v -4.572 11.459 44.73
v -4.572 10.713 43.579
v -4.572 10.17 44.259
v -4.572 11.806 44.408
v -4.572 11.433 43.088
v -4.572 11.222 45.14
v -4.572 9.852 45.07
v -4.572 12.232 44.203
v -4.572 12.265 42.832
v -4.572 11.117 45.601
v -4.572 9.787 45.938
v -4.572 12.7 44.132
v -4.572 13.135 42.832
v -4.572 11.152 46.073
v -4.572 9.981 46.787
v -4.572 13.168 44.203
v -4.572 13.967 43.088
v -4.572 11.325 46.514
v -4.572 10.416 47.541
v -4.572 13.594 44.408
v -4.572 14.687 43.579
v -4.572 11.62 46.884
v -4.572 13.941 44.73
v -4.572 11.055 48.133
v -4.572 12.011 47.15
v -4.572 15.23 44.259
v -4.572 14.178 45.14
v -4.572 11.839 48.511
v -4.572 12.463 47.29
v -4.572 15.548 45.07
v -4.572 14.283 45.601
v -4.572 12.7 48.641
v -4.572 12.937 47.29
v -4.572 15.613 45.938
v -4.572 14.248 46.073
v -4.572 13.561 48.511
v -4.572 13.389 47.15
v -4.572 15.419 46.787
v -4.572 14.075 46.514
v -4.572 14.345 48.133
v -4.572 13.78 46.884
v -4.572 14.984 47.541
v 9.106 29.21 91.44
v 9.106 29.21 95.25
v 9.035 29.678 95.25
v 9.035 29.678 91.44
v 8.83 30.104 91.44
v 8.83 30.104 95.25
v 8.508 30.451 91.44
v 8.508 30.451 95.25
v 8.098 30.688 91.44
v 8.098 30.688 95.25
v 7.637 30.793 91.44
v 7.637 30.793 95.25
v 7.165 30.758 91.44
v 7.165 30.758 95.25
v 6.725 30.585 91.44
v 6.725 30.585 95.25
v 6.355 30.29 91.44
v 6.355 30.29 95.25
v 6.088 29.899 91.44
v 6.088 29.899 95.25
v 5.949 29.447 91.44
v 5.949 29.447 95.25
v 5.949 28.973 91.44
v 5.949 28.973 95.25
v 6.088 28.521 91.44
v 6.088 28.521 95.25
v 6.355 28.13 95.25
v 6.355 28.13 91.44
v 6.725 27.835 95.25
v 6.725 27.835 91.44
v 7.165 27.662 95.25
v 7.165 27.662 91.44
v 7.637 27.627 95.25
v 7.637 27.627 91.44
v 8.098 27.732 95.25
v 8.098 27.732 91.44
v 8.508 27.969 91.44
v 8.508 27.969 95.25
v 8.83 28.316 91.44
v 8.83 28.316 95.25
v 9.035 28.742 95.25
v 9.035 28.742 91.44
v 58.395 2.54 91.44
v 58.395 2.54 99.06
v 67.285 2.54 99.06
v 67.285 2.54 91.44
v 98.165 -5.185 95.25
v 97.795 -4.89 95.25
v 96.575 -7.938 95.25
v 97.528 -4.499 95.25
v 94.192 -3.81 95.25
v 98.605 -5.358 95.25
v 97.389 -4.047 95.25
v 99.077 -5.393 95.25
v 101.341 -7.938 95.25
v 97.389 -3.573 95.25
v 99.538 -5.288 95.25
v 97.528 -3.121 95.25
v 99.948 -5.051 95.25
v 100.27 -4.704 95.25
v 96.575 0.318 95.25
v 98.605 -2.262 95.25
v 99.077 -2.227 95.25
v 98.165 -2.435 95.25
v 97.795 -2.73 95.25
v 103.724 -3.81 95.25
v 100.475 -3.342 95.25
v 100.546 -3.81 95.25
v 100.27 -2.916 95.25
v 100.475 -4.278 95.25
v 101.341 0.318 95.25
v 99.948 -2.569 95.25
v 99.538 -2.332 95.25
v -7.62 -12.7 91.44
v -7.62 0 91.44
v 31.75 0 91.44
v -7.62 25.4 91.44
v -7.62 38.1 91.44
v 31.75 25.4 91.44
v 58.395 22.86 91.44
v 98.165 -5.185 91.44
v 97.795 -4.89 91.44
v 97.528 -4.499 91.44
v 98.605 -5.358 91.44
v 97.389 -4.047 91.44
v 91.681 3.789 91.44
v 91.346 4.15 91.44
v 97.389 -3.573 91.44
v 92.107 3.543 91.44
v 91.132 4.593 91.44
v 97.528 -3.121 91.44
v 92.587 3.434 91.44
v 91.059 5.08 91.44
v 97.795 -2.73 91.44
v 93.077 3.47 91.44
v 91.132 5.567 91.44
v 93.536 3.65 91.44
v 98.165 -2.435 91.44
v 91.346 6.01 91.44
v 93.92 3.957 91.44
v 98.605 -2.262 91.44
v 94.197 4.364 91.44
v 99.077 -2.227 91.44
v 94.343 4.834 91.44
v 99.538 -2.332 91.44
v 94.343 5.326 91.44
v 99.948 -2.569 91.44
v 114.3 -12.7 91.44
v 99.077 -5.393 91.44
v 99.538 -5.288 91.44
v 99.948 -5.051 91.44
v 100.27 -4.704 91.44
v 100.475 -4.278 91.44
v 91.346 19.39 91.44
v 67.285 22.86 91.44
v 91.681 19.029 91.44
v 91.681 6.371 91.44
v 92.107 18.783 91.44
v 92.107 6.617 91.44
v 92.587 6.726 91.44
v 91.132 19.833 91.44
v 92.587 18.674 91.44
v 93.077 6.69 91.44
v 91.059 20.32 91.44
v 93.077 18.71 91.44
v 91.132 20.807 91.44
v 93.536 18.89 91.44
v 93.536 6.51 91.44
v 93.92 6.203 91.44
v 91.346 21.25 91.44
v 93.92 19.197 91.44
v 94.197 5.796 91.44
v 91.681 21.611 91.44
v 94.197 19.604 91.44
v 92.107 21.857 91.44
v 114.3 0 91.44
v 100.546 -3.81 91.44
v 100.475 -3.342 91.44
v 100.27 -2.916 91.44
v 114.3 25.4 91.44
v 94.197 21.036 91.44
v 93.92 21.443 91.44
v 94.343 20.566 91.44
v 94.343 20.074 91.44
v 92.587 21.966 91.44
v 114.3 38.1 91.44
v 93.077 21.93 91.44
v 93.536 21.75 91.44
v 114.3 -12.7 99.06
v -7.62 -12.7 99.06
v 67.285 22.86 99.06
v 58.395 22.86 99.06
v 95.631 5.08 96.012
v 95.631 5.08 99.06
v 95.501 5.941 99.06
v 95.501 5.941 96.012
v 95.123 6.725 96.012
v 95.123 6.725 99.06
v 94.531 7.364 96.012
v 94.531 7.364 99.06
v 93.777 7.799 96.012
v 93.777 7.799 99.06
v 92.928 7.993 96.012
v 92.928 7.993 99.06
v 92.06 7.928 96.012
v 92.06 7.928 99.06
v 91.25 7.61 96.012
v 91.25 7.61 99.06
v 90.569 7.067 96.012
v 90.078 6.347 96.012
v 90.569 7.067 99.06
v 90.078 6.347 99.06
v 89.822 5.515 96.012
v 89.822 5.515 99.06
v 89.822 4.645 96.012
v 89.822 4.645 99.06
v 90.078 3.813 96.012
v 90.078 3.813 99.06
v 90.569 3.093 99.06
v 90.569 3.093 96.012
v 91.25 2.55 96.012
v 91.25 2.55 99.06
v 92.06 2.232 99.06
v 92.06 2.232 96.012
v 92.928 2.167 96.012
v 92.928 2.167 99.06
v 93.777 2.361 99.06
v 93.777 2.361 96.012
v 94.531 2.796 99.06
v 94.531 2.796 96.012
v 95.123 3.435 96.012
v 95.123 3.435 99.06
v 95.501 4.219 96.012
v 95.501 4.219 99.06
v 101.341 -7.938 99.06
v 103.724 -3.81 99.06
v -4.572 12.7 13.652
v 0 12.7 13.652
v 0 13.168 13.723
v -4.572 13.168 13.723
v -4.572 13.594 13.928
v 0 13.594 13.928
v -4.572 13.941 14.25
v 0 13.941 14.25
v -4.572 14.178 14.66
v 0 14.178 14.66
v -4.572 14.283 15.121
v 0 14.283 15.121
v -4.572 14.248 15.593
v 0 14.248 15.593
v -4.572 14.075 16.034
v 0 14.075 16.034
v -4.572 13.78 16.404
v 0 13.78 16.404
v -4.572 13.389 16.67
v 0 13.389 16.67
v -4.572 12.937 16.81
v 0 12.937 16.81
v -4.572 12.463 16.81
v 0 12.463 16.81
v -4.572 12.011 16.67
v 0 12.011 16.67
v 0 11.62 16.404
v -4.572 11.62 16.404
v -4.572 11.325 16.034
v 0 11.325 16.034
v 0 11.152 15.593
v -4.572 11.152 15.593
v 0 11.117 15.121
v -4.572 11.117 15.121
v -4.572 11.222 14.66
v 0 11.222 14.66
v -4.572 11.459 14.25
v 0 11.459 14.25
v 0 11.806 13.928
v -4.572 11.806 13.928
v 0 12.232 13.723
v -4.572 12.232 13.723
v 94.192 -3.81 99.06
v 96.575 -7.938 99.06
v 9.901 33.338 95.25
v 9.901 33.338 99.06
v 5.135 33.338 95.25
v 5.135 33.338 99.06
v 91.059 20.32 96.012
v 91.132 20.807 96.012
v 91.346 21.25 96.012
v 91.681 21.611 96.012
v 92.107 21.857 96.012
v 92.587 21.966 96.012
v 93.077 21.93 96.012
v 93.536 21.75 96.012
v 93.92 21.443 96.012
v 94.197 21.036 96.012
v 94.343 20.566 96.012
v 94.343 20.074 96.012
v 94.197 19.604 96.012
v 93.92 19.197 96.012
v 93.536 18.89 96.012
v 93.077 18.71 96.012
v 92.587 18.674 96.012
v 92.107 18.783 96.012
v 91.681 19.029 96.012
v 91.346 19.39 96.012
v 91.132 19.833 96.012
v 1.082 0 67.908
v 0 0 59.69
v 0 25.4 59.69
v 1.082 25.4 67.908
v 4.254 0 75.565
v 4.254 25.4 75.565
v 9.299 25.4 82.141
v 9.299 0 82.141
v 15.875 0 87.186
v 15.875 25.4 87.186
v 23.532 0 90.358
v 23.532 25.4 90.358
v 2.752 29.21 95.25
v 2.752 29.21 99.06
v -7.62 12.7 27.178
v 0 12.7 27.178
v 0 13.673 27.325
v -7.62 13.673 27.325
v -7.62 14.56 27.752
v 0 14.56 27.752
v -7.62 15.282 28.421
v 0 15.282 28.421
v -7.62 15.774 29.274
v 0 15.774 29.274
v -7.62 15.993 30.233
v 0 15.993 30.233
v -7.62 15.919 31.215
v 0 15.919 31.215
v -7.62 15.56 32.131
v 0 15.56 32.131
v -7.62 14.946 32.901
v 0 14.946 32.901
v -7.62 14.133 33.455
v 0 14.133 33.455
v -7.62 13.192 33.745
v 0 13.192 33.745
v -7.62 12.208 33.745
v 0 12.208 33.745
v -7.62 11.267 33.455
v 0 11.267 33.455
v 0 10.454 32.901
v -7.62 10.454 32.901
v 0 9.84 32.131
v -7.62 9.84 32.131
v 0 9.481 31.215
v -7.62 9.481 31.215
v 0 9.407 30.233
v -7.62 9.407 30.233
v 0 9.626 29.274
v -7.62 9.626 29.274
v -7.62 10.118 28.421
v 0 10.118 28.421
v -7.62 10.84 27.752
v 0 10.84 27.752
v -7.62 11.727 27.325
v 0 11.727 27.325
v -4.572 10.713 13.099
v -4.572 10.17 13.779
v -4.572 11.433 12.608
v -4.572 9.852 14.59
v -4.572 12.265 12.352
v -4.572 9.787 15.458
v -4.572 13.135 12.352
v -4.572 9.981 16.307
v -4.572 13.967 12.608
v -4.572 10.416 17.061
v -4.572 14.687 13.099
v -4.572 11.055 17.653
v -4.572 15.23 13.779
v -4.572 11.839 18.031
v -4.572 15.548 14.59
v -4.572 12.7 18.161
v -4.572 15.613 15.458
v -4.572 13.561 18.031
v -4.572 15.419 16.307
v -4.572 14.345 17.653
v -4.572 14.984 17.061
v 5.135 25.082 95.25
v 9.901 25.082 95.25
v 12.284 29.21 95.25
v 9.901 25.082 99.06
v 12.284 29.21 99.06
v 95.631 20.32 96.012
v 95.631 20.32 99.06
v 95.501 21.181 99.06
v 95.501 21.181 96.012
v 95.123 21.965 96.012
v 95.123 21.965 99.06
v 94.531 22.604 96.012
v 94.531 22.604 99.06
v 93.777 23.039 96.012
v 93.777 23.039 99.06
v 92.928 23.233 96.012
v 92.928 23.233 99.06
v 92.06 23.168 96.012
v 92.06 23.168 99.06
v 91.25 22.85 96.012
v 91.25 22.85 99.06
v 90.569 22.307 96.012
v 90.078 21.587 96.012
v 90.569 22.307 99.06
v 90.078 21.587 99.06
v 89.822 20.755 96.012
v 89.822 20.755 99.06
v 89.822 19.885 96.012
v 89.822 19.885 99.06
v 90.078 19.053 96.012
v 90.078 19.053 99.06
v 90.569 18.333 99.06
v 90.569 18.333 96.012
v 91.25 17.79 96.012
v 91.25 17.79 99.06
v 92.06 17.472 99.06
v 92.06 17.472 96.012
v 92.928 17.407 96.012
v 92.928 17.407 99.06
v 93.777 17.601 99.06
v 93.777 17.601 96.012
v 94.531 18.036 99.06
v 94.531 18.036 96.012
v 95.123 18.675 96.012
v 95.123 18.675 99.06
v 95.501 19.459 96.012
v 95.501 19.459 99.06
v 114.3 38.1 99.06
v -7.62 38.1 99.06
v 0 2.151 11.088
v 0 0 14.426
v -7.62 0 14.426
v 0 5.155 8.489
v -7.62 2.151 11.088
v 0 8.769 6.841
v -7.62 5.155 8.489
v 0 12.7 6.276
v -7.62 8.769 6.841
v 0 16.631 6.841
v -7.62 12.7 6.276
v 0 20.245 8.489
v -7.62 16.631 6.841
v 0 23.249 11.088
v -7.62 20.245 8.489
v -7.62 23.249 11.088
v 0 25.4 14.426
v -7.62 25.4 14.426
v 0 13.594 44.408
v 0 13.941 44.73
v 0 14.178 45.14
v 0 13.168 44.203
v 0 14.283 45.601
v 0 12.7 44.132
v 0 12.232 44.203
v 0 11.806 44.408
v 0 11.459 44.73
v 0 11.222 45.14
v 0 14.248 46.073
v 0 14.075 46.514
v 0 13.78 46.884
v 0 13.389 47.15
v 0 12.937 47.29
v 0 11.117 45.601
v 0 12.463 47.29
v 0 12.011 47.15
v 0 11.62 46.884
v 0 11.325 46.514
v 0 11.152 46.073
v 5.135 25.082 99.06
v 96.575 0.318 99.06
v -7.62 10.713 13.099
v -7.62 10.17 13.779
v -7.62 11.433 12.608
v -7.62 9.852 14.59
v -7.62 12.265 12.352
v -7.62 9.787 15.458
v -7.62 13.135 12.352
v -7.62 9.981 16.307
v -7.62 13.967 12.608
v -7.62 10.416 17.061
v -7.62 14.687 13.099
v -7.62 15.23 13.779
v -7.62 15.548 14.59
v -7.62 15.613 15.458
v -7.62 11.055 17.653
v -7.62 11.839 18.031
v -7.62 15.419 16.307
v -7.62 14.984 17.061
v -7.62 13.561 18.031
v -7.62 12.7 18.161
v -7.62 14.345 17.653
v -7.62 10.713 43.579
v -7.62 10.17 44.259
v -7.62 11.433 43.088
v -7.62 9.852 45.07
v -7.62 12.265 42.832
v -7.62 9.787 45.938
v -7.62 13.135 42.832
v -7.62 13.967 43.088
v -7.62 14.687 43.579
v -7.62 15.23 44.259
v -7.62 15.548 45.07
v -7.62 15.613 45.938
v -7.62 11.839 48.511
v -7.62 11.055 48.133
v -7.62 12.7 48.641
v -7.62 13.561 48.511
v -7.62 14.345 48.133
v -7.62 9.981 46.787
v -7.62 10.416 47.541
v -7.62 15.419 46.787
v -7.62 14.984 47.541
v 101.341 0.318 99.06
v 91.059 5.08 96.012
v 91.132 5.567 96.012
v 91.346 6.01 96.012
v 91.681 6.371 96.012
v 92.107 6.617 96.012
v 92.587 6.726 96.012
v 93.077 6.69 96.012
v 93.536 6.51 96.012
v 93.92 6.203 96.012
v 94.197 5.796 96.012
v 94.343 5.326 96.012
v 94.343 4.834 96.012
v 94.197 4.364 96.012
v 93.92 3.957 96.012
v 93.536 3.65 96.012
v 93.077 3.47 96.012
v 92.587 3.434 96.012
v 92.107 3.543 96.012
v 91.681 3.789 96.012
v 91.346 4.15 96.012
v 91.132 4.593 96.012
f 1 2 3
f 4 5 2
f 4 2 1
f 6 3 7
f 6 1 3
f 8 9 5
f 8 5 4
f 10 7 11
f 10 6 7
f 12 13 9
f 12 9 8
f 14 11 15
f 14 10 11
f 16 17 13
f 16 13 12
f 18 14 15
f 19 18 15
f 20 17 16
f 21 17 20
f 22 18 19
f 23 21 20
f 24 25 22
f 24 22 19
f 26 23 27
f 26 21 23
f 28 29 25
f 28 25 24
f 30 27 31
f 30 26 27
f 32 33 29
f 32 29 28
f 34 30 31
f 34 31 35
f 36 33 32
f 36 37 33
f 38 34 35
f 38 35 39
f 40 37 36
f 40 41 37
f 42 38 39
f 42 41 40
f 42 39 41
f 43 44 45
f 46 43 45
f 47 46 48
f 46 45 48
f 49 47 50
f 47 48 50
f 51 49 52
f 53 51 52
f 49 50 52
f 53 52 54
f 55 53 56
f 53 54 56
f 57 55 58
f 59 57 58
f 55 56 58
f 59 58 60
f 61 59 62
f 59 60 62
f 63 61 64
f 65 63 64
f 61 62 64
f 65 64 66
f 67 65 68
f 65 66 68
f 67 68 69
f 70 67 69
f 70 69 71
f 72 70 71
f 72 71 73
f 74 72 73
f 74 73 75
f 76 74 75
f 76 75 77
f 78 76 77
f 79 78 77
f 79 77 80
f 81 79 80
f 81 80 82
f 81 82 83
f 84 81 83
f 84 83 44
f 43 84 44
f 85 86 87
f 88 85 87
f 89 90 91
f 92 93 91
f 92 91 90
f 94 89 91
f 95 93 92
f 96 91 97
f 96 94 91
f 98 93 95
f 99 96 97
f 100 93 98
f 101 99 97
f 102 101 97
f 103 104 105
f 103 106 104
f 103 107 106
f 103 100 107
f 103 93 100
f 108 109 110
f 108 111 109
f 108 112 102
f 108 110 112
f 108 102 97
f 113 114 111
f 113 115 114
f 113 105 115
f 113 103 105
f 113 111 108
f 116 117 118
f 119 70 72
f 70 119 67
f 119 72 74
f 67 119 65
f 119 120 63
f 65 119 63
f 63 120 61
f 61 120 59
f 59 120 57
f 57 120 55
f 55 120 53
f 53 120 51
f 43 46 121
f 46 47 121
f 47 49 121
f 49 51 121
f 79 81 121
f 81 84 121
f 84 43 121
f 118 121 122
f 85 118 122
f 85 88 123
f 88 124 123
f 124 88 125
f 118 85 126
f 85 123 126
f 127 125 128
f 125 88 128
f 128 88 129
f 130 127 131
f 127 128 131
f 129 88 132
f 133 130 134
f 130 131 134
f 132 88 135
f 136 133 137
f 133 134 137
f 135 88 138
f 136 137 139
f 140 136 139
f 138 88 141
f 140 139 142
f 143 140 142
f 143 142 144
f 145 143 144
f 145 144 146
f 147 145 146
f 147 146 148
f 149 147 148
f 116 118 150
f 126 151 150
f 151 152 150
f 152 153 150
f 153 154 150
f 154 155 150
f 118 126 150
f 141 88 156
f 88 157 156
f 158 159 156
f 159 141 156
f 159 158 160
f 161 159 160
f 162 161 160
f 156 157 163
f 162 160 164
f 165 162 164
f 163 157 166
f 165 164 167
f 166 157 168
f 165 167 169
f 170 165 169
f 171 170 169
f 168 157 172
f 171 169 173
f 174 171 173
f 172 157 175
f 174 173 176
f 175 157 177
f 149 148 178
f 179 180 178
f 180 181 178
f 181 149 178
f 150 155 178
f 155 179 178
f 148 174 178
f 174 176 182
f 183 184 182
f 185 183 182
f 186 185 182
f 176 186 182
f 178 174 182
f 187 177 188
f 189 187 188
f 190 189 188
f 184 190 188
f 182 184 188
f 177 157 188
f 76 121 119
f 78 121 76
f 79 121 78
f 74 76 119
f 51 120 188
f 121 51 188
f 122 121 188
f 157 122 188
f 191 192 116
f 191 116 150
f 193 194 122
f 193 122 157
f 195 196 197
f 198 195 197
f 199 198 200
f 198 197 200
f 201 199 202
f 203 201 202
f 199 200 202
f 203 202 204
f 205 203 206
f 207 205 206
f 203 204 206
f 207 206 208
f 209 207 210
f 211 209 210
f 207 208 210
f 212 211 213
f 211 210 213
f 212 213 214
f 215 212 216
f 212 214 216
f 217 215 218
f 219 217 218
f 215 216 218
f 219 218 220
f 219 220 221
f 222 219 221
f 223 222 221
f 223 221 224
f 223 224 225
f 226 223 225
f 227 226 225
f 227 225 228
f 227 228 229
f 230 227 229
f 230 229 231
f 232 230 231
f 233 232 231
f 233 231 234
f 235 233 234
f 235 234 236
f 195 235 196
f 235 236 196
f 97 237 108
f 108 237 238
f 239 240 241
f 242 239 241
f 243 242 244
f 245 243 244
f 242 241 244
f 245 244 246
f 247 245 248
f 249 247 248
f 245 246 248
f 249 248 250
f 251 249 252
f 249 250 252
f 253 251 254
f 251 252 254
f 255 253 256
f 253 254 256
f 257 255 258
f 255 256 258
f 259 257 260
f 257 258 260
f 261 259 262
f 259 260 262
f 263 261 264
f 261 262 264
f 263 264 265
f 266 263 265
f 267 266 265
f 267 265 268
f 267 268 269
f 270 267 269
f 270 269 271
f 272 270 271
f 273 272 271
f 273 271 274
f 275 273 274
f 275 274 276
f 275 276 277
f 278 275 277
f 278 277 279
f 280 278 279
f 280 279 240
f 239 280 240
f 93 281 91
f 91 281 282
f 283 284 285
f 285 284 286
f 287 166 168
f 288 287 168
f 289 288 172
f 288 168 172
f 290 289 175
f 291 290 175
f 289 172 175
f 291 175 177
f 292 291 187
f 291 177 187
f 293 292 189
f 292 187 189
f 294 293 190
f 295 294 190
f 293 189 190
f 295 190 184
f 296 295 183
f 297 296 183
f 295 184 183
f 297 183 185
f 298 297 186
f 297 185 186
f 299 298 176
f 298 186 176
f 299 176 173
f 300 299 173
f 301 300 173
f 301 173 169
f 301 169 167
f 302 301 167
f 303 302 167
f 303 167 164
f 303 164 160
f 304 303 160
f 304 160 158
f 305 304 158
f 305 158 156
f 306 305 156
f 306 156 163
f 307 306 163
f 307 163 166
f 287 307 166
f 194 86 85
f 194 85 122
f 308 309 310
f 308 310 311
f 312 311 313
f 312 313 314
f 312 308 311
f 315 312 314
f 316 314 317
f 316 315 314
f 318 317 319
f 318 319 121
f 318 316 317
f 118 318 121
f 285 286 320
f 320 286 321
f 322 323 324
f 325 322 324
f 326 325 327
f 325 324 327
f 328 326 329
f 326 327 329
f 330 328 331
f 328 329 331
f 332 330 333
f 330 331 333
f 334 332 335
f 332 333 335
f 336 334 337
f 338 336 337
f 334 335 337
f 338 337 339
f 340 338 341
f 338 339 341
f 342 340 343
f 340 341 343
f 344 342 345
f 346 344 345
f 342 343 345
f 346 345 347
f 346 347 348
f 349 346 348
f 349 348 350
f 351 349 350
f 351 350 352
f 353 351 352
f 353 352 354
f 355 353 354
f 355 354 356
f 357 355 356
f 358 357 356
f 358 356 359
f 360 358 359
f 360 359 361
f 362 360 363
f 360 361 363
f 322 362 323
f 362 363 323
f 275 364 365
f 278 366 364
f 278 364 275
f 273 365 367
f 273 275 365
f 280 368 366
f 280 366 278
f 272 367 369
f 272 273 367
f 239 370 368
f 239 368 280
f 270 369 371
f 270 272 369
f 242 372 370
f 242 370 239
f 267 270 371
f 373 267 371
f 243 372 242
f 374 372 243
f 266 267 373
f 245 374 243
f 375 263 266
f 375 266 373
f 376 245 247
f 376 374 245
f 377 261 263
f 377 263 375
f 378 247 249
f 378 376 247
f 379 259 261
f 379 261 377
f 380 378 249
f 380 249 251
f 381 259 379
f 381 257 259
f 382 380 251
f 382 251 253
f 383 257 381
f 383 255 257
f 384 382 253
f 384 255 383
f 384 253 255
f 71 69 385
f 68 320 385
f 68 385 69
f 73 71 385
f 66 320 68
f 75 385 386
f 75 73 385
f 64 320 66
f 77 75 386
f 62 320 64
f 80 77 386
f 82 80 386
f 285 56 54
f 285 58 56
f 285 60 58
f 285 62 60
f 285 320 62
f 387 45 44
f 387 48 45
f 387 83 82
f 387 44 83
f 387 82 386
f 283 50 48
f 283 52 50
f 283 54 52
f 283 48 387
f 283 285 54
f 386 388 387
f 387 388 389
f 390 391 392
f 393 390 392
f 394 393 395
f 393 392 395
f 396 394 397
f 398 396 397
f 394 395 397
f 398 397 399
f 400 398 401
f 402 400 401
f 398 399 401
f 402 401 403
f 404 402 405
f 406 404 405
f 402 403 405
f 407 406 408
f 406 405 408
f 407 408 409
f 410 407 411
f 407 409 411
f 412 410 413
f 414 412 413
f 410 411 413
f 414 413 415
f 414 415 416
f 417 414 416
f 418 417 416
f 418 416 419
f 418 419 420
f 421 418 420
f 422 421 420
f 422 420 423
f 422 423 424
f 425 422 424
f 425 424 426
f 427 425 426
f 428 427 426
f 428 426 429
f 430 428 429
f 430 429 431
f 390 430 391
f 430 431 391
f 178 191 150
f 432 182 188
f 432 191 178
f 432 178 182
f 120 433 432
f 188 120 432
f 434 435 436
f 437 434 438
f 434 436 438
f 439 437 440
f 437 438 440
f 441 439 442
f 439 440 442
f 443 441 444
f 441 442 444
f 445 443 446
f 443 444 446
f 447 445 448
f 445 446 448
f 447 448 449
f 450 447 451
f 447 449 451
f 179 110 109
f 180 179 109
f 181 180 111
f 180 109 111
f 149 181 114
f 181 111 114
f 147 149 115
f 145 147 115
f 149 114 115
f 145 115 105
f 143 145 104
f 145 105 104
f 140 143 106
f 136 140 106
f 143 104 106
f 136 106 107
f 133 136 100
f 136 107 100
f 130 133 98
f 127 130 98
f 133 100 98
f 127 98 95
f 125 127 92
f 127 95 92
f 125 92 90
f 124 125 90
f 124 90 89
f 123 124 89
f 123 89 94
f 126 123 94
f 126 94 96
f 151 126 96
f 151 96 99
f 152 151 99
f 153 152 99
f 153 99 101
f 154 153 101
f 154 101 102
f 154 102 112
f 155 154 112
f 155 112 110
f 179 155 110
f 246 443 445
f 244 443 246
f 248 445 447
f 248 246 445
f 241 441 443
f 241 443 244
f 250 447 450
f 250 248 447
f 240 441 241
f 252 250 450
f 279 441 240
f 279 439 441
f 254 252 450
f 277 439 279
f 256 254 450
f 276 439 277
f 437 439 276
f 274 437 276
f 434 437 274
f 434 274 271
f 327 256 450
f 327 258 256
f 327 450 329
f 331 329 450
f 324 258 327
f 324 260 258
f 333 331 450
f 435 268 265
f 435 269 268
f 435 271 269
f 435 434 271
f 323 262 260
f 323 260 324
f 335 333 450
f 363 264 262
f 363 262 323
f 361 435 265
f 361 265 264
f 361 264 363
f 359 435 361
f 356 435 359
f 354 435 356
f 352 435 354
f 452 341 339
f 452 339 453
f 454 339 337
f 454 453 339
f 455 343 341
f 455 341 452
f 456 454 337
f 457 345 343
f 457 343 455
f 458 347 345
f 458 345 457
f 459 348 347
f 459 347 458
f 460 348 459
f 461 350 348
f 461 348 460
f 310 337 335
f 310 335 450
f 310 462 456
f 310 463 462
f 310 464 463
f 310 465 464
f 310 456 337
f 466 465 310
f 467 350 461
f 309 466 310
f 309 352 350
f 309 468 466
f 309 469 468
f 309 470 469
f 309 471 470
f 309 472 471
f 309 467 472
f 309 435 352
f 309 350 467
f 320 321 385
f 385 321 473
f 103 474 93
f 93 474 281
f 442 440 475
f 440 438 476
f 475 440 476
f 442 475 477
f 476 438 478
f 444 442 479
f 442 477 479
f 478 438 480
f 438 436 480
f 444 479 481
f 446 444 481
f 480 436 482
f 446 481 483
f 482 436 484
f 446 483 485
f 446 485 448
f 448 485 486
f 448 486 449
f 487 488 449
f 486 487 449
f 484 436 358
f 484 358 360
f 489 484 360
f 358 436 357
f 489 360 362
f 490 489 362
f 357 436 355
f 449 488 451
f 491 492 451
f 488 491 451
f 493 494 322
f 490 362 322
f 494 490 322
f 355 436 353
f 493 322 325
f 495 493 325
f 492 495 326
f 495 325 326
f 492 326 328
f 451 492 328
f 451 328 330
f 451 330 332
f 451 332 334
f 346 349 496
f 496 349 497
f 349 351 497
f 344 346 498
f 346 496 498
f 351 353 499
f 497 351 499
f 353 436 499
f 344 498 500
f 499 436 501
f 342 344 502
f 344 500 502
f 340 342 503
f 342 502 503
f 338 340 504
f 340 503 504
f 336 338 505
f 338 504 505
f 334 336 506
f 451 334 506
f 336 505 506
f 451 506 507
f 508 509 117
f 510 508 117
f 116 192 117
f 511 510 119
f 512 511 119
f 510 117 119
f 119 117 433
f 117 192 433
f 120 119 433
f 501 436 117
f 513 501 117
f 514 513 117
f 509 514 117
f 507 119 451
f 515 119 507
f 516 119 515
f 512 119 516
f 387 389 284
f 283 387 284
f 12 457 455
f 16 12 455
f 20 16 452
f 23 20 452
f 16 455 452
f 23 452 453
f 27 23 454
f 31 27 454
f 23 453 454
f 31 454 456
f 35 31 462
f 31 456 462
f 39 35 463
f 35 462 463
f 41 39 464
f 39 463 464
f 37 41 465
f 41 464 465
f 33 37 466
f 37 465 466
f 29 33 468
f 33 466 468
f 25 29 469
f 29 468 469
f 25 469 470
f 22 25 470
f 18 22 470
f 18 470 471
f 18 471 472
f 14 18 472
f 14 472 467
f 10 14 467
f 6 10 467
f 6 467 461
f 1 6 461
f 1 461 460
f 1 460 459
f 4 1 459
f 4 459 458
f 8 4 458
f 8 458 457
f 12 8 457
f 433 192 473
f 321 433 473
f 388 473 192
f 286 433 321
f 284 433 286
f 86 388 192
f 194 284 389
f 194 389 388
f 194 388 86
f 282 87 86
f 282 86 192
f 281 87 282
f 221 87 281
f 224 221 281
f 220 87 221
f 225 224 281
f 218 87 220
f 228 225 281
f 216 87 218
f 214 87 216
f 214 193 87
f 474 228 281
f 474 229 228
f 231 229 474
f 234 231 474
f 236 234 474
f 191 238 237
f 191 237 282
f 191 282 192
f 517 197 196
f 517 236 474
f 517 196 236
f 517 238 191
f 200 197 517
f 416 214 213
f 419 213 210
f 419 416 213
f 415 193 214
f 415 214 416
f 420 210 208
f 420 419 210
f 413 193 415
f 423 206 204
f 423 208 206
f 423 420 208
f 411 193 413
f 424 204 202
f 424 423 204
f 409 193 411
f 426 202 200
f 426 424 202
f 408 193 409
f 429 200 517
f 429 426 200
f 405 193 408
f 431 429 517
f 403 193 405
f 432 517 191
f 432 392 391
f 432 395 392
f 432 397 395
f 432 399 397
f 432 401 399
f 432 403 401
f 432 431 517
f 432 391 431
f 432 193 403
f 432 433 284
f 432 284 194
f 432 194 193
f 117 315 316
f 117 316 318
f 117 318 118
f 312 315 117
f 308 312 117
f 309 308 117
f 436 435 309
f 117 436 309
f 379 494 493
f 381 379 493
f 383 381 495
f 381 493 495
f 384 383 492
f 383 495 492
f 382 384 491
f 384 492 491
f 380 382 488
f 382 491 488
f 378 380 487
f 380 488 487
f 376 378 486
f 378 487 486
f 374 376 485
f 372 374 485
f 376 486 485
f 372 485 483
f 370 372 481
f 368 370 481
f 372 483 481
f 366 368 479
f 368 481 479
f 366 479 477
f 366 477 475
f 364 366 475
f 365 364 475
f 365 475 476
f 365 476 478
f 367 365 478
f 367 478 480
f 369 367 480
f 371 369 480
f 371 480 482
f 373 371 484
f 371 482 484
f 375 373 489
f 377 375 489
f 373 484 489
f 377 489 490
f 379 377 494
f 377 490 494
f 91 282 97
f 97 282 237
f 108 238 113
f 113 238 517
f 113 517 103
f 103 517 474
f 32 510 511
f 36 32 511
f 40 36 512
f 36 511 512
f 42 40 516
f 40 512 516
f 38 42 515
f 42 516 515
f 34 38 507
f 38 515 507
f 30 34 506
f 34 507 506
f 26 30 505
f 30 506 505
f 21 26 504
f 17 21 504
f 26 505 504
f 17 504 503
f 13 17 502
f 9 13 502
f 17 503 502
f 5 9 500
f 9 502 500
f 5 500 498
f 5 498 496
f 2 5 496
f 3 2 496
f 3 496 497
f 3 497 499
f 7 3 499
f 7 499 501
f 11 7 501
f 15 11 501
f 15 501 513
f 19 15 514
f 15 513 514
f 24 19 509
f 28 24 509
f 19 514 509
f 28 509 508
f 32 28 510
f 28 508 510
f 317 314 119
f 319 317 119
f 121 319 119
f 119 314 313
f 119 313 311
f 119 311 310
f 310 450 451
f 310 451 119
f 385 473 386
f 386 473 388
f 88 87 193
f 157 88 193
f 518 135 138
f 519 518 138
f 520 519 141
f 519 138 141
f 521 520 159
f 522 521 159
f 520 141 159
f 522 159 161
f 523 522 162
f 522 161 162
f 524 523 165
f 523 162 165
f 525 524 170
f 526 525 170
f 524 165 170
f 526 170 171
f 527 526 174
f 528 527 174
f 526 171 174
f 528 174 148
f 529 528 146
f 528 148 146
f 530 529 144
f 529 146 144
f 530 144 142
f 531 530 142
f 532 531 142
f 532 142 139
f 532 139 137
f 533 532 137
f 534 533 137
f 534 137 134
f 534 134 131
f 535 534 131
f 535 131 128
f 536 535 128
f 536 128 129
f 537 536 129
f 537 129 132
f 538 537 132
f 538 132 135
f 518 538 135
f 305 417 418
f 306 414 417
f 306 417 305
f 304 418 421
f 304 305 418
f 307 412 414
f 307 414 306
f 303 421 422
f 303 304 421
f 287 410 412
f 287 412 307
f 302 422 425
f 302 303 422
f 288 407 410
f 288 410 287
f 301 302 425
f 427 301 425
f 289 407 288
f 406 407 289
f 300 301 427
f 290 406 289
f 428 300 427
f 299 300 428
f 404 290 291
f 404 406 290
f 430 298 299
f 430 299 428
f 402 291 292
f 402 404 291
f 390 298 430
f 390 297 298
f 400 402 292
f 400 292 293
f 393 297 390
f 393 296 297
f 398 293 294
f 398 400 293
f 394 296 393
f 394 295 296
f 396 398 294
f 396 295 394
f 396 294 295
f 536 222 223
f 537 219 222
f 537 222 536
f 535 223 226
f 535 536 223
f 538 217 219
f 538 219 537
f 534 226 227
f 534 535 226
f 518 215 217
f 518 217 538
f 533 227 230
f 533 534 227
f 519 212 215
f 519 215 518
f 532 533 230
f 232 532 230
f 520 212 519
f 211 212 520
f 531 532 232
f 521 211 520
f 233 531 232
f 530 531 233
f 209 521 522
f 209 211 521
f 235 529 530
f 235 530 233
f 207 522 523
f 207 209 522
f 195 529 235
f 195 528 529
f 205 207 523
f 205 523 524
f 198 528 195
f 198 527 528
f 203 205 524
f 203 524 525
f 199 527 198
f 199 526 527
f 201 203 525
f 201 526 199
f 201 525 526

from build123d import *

# Parameters (mm, degrees)
BOSS_EXTRUDE1_DEPTH     = 25.4
SKETCH4_R               = 3.302
CUT_EXTRUDE2_DEPTH      = 7.62
SKETCH2_R               = 1.5875
SKETCH2_R_2             = 3.302
CUT_EXTRUDE3_DEPTH      = 7.62
SKETCH6_W               = 121.92
SKETCH6_H               = 12.7
BOSS_EXTRUDE2_DEPTH     = 7.62
CUT_EXTRUDE4_DEPTH      = 3.81
SKETCH10_R              = 2.921
CUT_EXTRUDE5_DEPTH      = 3.048
SKETCH11_R              = 1.5875
CUT_EXTRUDE6_DEPTH      = 96.25
CUT_EXTRUDE7_REACH      = 101.06
SKETCH12_W              = 8.89
SKETCH12_H              = 20.32
CUT_EXTRUDE8_DEPTH      = 1
CUT_EXTRUDE8_DEPTH_BACK = 122.92
SKETCH15_R              = 1.651
CUT_EXTRUDE9_DEPTH      = 8.62
SKETCH16_R              = 2.921
CUT_EXTRUDE10_DEPTH     = 3.048
SKETCH17_W              = 46.323198875
SKETCH17_H              = 88.058880532
CUT_EXTRUDE11_DEPTH     = 51.8


with BuildPart() as part:
    # Sketch1 → Boss-Extrude1 (new body)
    with BuildSketch(Plane(origin=(0, 0, 0), x_dir=(1, 0, 0), z_dir=(0, 1, 0))):
        with BuildLine():
            Line((0, 0), (0, -59.69))
            ThreePointArc((0, -59.69), (9.299359697, -82.140640303), (31.75, -91.44))
            Line((31.75, -91.44), (69.85, -91.44))
            ThreePointArc((69.85, -91.44), (92.300640303, -82.140640303), (101.6, -59.69))
            Line((101.6, -59.69), (101.6, 0))
            Line((101.6, 0), (114.3, 0))
            Line((114.3, 0), (114.3, -99.06))
            Line((114.3, -99.06), (-7.62, -99.06))
            Line((-7.62, -99.06), (-7.62, 0))
            Line((-7.62, 0), (0, 0))
        make_face()
    extrude(amount=BOSS_EXTRUDE1_DEPTH)

    # Sketch4 → Cut-Extrude2 (cut)
    with BuildSketch(Plane.ZY.offset(-101.6)):
        with Locations((30.48, 12.7)):
            Circle(SKETCH4_R)
    extrude(amount=-CUT_EXTRUDE2_DEPTH, mode=Mode.SUBTRACT)

    # Sketch2 → Cut-Extrude3 (cut)
    with BuildSketch(Plane(origin=(0, 0, 0), x_dir=(0, 0, -1), z_dir=(1, 0, 0))):
        with Locations((-15.24, 12.7)):
            Circle(SKETCH2_R)
        with Locations((-45.72, 12.7)):
            Circle(SKETCH2_R)
        with Locations((-30.48, 12.7)):
            Circle(SKETCH2_R_2)
    extrude(amount=-CUT_EXTRUDE3_DEPTH, mode=Mode.SUBTRACT)

    # Sketch6 → Boss-Extrude2 (add)
    with BuildSketch(Plane.XY.offset(99.06)):
        with Locations((53.34, 31.75)):
            Rectangle(SKETCH6_W, SKETCH6_H)
        with Locations((53.34, -6.35)):
            Rectangle(SKETCH6_W, SKETCH6_H)
    extrude(amount=-BOSS_EXTRUDE2_DEPTH)

    # Sketch7 → Cut-Extrude4 (cut)
    with BuildSketch(Plane.XY.offset(99.06)):
        Polygon((12.284426472, 29.21), (9.901413236, 33.3375), (5.135386764, 33.3375), (2.752373528, 29.21), (5.135386764, 25.0825), (9.901413236, 25.0825), align=None)
        Polygon((103.724426472, -3.81), (101.341413236, 0.3175), (96.575386764, 0.3175), (94.192373528, -3.81), (96.575386764, -7.9375), (101.341413236, -7.9375), align=None)
    extrude(amount=-CUT_EXTRUDE4_DEPTH, mode=Mode.SUBTRACT)

    # Sketch10 → Cut-Extrude5 (cut)
    with BuildSketch(Plane.ZY.offset(7.62)):
        with Locations((15.24, 12.7)):
            Circle(SKETCH10_R)
        with Locations((45.72, 12.7)):
            Circle(SKETCH10_R)
    extrude(amount=-CUT_EXTRUDE5_DEPTH, mode=Mode.SUBTRACT)

    # Sketch11 → Cut-Extrude6 (cut, through all)
    with BuildSketch(Plane.XY.offset(95.25)):
        with Locations((7.5184, 29.21)):
            Circle(SKETCH11_R)
        with Locations((98.9584, -3.81)):
            Circle(SKETCH11_R)
    extrude(amount=-CUT_EXTRUDE6_DEPTH, mode=Mode.SUBTRACT)

    # Sketch12 → Cut-Extrude7 (cut, up to next)
    with BuildSketch(Plane.XY.offset(99.06), mode=Mode.PRIVATE) as cut_extrude7_sk1:
        with Locations((62.8396, 12.7)):
            Rectangle(SKETCH12_W, SKETCH12_H)
    cut_extrude7_tool1 = extrude(cut_extrude7_sk1.sketch, amount=-CUT_EXTRUDE7_REACH, mode=Mode.PRIVATE) & part.part
    add(cut_extrude7_tool1.solids().sort_by_distance((62.8396, 12.7, 99.06))[0], mode=Mode.SUBTRACT)

    # Sketch14 → Cut-Extrude8 (cut, two sides)
    with BuildSketch(Plane.ZY.offset(7.62)) as cut_extrude8_sk:
        with BuildLine():
            Line((14.426351463, 25.4), (0, 25.4))
            Line((0, 25.4), (0, 0))
            Line((0, 0), (14.426351463, 0))
            ThreePointArc((14.426351463, 0), (6.276222595, 12.7), (14.426351463, 25.4))
        make_face()
    extrude(amount=CUT_EXTRUDE8_DEPTH, mode=Mode.SUBTRACT)
    extrude(cut_extrude8_sk.sketch, amount=-CUT_EXTRUDE8_DEPTH_BACK, mode=Mode.SUBTRACT)

    # Sketch15 → Cut-Extrude9 (cut, through all)
    with BuildSketch(Plane(origin=(0, 0, 91.44), x_dir=(-1, 0, 0), z_dir=(0, 0, -1))):
        with Locations((-92.71, 20.32)):
            Circle(SKETCH15_R)
        with Locations((-92.71, 5.08)):
            Circle(SKETCH15_R)
    extrude(amount=-CUT_EXTRUDE9_DEPTH, mode=Mode.SUBTRACT)

    # Sketch16 → Cut-Extrude10 (cut)
    with BuildSketch(Plane.XY.offset(99.06)):
        with Locations((92.71, 20.32)):
            Circle(SKETCH16_R)
        with Locations((92.71, 5.08)):
            Circle(SKETCH16_R)
    extrude(amount=-CUT_EXTRUDE10_DEPTH, mode=Mode.SUBTRACT)

    # Sketch17 → Cut-Extrude11 (cut, through all)
    with BuildSketch(Plane(origin=(0, 38.1, 0), x_dir=(1, 0, 0), z_dir=(0, 1, 0))):
        with Locations((91.138400563, -47.410559734)):
            Rectangle(SKETCH17_W, SKETCH17_H)
    extrude(amount=-CUT_EXTRUDE11_DEPTH, mode=Mode.SUBTRACT)


solid = part.part
